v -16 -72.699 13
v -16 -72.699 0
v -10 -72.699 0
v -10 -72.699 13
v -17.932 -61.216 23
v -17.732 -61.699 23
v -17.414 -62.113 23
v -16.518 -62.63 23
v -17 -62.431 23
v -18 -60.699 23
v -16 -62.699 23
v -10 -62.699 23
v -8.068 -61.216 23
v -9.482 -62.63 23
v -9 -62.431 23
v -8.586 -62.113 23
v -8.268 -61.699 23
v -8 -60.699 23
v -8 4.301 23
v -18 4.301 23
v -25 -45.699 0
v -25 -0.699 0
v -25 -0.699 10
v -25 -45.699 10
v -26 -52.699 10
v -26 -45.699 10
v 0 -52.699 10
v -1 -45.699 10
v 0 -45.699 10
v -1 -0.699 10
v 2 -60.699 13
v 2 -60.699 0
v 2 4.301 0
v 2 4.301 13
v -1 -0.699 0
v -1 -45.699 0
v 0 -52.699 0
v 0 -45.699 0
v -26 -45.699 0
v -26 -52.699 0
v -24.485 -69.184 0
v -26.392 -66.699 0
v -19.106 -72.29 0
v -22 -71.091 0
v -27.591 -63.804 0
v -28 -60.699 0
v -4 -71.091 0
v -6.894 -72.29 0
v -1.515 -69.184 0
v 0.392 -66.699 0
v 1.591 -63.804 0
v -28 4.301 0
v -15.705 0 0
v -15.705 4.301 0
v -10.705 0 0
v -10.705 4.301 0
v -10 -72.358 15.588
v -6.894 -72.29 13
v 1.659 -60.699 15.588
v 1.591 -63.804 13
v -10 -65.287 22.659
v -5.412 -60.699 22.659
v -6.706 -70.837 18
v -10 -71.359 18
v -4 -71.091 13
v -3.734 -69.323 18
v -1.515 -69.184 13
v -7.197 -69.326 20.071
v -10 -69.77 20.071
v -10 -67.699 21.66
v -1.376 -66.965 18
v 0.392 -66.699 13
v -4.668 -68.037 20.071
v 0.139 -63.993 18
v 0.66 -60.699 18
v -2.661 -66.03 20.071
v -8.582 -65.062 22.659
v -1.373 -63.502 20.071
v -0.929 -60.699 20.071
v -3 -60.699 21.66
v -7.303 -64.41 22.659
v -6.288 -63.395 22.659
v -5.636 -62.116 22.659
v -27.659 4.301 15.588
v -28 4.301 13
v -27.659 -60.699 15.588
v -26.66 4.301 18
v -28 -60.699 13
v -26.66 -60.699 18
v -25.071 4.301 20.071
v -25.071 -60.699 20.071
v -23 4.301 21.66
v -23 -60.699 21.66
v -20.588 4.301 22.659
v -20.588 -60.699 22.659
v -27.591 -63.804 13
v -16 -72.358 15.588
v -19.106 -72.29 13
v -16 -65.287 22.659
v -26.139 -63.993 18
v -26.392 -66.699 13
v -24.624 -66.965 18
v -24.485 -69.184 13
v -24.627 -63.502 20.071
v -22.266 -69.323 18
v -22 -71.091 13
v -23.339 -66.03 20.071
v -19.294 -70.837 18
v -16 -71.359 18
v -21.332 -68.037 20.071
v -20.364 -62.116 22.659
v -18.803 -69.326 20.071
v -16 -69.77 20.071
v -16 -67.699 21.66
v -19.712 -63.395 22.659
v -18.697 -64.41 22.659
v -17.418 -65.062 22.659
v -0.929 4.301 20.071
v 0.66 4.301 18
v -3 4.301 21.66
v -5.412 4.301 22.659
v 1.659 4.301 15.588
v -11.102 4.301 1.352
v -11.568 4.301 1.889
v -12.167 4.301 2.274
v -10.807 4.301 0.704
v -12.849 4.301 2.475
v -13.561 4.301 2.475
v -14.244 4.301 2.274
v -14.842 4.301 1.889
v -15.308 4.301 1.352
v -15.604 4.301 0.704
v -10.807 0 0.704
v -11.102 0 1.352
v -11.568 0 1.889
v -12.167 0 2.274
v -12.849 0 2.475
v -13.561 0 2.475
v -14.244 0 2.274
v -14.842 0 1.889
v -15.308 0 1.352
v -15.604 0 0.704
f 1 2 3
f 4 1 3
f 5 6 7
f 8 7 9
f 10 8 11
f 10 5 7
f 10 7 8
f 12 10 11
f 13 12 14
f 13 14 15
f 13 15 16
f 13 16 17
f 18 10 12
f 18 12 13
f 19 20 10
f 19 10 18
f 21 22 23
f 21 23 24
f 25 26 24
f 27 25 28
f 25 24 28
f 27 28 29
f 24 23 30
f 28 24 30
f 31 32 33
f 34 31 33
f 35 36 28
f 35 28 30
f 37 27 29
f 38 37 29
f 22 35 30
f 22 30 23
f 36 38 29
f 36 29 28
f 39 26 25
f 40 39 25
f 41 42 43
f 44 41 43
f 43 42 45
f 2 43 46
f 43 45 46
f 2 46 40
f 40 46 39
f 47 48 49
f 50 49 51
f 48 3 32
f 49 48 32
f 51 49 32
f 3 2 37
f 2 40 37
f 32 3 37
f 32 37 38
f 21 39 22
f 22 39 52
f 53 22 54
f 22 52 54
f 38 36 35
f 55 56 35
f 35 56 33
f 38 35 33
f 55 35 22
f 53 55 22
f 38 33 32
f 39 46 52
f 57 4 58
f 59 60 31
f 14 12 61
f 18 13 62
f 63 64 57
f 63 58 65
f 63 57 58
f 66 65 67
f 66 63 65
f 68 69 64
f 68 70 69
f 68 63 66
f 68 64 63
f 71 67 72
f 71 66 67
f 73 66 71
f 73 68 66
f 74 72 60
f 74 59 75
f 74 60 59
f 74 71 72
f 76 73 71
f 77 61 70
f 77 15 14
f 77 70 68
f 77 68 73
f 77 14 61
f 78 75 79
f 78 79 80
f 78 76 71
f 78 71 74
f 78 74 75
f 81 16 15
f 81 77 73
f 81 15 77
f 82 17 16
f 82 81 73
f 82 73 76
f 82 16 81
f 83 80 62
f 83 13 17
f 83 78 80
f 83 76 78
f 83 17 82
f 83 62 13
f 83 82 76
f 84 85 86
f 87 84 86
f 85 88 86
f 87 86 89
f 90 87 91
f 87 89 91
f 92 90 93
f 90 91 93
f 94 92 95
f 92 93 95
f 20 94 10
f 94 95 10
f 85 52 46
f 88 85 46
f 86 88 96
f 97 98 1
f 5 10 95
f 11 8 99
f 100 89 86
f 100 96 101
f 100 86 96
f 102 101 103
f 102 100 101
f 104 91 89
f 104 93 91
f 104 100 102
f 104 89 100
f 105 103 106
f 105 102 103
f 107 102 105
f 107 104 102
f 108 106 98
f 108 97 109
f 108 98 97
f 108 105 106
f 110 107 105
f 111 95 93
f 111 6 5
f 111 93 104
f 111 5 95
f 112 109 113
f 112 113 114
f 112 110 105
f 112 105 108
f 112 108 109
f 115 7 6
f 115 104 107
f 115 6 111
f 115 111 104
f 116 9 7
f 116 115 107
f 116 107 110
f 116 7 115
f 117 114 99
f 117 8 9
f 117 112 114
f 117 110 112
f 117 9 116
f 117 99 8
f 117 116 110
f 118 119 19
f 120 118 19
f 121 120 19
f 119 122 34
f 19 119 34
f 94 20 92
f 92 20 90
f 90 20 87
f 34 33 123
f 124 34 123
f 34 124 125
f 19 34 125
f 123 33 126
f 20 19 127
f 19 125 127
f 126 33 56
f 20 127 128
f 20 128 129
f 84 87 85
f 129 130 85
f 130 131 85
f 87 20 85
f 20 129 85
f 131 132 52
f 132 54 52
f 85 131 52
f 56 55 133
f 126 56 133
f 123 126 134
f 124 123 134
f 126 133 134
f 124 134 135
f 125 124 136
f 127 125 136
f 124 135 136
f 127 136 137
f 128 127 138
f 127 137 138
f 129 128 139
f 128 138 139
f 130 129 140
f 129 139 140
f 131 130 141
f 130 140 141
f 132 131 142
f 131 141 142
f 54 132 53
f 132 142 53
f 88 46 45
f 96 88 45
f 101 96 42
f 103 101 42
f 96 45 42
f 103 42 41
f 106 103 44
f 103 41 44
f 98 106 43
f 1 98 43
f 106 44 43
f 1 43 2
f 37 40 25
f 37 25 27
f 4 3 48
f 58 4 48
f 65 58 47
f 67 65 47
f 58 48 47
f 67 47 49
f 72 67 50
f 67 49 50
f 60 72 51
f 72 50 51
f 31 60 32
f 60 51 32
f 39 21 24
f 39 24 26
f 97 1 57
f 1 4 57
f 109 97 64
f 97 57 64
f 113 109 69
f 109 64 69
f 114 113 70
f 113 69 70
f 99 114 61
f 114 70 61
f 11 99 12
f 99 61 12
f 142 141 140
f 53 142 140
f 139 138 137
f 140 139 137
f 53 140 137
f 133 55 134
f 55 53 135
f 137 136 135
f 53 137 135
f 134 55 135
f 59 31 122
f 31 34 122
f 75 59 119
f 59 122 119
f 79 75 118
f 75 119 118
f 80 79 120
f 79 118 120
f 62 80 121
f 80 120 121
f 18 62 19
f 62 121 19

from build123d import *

# Parameters (mm, degrees)
F1_DEPTH = 23
F2_DEPTH = 23
F3_DEPTH = 10
F4_R     = 10
F6_D     = 5
F6_DEPTH = 4.3024359474


with BuildPart() as f1:
    # F0 (on Top) → F1 (new body)
    with BuildSketch(Plane.XY):
        with BuildLine():
            ThreePointArc((-10, -72.6985640526), (-1.5147186258, -69.1838454268), (2, -60.6985640526))
            Line((2, -60.6985640526), (2, 4.3014359474))
            Line((2, 4.3014359474), (-28, 4.3014359474))
            Line((-28, 4.3014359474), (-28, -60.6985640526))
            ThreePointArc((-28, -60.6985640526), (-24.4852813742, -69.1838454268), (-16, -72.6985640526))
            Line((-16, -72.6985640526), (-10, -72.6985640526))
        make_face()
        Polygon((-25, -45.6985640526), (-25, -0.6985640526), (-1, -0.6985640526), (-1, -45.6985640526), (0, -45.6985640526), (0, -52.6985640526), (-26, -52.6985640526), (-26, -45.6985640526), align=None, mode=Mode.SUBTRACT)
    extrude(amount=F1_DEPTH)

    # F0 (on Top) → F2 (join)
    with BuildSketch(Plane.XY):
        Polygon((-1, -0.6985640526), (-25, -0.6985640526), (-25, -45.6985640526), (-26, -45.6985640526), (-26, -52.6985640526), (0, -52.6985640526), (0, -45.6985640526), (-1, -45.6985640526), align=None)
    extrude(amount=F2_DEPTH)

    # F0 (on Top) → F3 (cut)
    with BuildSketch(Plane.XY):
        Polygon((-1, -0.6985640526), (-25, -0.6985640526), (-25, -45.6985640526), (-26, -45.6985640526), (-26, -52.6985640526), (0, -52.6985640526), (0, -45.6985640526), (-1, -45.6985640526), align=None)
    extrude(amount=F3_DEPTH, mode=Mode.SUBTRACT)

    # F4
    f4_edges = [f1.edges().sort_by_distance(p)[0] for p in [
        (-28, -28.198564, 23),
    ]]
    fillet(f4_edges, radius=F4_R)

    # F6 (through all, one way)
    with BuildSketch(Plane.XZ):
        with Locations((-13.2052563131, 0)):
            Circle(F6_D / 2)
    extrude(amount=-F6_DEPTH, mode=Mode.SUBTRACT)


solid = f1.part
